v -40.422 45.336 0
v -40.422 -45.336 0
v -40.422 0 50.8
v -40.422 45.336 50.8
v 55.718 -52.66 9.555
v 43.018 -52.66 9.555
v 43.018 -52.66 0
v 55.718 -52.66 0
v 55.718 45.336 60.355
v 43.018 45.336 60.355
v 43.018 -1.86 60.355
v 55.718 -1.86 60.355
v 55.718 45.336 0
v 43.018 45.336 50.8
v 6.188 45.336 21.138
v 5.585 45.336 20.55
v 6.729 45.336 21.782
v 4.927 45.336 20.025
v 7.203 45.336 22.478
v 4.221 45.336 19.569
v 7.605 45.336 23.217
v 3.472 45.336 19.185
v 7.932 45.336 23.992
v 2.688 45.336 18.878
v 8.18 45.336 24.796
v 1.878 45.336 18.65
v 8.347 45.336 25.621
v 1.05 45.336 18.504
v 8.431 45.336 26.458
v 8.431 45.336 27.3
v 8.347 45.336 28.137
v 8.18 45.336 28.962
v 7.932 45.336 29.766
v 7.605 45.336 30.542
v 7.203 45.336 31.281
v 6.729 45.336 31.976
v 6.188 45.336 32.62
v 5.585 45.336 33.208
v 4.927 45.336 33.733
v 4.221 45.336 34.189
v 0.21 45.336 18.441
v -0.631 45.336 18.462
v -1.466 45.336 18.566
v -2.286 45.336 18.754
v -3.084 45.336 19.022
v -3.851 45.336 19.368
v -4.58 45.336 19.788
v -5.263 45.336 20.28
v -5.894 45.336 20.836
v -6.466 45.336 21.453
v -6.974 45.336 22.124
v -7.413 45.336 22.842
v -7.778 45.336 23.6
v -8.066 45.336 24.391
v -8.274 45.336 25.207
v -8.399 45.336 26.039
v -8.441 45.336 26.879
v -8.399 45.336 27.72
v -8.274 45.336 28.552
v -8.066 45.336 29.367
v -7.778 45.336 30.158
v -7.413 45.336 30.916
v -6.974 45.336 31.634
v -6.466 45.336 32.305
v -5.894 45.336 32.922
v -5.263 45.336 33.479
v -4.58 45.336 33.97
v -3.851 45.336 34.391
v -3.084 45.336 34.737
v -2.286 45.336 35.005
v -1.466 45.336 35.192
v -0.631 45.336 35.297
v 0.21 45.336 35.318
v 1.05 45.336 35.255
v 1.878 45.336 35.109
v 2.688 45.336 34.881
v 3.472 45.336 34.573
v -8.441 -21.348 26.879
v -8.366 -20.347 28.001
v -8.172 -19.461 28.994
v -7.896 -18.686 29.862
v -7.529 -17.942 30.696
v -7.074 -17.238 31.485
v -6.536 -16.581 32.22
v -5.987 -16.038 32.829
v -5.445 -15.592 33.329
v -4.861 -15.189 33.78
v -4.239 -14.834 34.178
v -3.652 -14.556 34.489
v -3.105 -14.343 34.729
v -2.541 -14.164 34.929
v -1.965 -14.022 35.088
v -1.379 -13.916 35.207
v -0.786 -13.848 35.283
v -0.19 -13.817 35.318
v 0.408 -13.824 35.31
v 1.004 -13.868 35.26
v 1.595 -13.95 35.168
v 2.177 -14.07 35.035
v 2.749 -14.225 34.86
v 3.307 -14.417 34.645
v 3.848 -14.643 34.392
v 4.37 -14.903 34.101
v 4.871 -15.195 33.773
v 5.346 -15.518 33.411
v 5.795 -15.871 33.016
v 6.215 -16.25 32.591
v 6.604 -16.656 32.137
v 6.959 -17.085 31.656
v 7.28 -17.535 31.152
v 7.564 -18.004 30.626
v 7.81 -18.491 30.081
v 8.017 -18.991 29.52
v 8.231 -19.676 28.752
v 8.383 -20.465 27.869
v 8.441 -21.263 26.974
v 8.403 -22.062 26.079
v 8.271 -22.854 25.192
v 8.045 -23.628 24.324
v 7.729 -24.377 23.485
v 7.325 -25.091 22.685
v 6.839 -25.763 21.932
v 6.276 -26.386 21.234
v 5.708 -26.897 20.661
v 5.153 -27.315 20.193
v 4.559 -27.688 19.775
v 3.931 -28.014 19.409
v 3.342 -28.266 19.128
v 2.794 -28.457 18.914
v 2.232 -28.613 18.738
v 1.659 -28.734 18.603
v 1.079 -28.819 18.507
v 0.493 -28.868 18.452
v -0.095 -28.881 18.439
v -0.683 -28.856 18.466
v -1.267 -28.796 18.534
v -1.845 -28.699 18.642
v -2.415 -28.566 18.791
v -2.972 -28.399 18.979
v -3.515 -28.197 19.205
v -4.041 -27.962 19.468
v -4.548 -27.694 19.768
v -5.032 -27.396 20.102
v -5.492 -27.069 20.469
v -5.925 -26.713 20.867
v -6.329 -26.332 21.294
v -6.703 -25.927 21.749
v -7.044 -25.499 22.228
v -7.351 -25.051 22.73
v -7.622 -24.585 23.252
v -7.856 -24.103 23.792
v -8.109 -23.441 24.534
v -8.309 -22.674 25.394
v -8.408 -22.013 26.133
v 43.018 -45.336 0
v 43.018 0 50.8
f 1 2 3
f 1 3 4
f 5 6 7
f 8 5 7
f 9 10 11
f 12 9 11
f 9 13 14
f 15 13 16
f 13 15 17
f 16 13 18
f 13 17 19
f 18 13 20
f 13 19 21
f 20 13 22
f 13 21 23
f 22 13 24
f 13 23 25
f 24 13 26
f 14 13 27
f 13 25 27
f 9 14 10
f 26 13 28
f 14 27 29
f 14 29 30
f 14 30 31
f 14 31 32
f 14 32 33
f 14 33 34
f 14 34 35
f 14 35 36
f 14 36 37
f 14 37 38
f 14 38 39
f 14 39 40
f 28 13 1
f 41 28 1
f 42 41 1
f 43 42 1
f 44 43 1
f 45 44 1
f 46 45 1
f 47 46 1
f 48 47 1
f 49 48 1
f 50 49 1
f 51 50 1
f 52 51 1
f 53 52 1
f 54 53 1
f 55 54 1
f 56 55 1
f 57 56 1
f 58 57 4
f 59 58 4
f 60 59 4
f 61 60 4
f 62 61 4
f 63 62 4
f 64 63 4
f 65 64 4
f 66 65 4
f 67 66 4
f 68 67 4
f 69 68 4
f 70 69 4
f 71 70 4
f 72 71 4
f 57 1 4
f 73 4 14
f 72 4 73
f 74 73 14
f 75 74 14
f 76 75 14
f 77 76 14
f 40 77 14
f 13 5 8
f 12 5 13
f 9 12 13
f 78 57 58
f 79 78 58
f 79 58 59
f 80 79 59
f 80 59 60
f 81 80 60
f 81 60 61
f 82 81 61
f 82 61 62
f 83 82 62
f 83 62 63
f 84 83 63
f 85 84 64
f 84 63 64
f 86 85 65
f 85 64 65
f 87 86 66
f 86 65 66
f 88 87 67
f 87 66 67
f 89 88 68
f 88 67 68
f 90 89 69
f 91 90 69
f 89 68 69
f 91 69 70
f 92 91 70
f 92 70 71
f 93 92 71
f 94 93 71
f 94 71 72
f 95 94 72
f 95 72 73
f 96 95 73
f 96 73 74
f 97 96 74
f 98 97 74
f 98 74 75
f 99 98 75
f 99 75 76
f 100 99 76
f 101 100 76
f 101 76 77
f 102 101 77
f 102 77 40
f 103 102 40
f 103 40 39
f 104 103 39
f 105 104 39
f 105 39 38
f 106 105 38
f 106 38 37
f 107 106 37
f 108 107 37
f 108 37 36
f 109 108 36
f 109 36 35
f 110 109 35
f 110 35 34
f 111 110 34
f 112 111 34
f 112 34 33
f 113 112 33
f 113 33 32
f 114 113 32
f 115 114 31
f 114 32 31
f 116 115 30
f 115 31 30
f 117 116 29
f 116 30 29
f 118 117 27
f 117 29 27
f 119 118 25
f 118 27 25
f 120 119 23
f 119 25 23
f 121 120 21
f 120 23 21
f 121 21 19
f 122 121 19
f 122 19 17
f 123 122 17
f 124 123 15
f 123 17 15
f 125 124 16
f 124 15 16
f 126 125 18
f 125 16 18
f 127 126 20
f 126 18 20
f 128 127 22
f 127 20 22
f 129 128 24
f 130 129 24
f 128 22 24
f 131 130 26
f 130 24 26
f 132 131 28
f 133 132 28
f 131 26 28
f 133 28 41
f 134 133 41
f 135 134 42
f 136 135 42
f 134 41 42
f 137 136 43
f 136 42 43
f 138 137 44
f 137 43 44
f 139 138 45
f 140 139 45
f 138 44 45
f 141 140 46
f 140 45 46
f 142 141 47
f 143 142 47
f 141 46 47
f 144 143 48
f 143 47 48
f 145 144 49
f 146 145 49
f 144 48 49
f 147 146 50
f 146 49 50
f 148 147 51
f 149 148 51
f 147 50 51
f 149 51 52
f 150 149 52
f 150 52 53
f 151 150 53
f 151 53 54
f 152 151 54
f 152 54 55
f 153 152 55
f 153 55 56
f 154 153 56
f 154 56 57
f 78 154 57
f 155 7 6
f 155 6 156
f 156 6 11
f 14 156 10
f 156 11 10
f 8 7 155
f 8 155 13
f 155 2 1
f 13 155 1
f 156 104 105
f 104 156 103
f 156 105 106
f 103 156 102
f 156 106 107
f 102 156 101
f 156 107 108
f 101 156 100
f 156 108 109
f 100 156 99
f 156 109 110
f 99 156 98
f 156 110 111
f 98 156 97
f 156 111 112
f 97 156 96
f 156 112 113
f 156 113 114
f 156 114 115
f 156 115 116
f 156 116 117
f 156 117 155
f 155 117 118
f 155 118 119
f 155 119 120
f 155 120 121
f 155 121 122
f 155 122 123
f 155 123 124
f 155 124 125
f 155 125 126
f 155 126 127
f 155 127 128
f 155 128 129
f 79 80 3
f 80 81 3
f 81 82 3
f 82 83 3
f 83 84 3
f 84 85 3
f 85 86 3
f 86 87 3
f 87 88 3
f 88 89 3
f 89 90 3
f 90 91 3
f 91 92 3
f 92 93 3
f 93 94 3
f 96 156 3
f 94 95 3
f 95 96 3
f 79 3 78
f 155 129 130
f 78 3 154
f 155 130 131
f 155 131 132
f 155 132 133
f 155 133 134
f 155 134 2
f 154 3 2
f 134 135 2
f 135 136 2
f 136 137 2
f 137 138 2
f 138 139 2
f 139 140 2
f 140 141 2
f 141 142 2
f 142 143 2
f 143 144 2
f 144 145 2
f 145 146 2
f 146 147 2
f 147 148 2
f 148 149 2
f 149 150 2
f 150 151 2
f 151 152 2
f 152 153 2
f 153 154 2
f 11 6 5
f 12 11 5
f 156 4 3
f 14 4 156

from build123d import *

# Parameters (mm, degrees)
F0_W     = 83.440322
F0_H     = 90.671822
F1_DEPTH = 50.8
F3_DEPTH = 83.441322
F4_R     = 8.441075
F5_DEPTH = 90.672822
F7_DEPTH = 12.7
F8_SIZE  = 50.8


with BuildPart() as f1:
    # F0 (on Top) → F1 (new body)
    with BuildSketch(Plane.XY):
        with Locations((1.29796, 0)):
            Rectangle(F0_W, F0_H)
    extrude(amount=F1_DEPTH)

    # F2 (on face) → F3 (cut, through all)
    with BuildSketch(Plane(origin=(-40.422201, 0, 0), x_dir=(0, -1, 0), z_dir=(-1, 0, 0))):
        Polygon((45.335911, 50.8), (0, 50.8), (45.335911, 0), align=None)
    extrude(amount=-F3_DEPTH, mode=Mode.SUBTRACT)

    # F4 (on face) → F5 (cut, through all)
    with BuildSketch(Plane(origin=(0, 45.335911, 0), x_dir=(-1, 0, 0), z_dir=(0, 1, 0))):
        with Locations((0, 26.879085)):
            Circle(F4_R)
    extrude(amount=-F5_DEPTH, mode=Mode.SUBTRACT)

    # F6 (on face) → F7 (join)
    with BuildSketch(Plane.YZ.offset(43.018121)):
        Polygon((-45.335911, 0), (45.335911, 0), (45.335911, 50.8), (0, 50.8), align=None)
        Polygon((-52.660115, 0), (-45.335911, 0), (0, 50.8), (45.335911, 50.8), (45.335911, 60.355168), (-52.660115, 60.355168), align=None)
    extrude(amount=F7_DEPTH)

    # F8
    f8_edges = [f1.edges().sort_by_distance(p)[0] for p in [
        (49.368121, -52.660115, 60.355168),
    ]]
    chamfer(f8_edges, length=F8_SIZE)


solid = f1.part
